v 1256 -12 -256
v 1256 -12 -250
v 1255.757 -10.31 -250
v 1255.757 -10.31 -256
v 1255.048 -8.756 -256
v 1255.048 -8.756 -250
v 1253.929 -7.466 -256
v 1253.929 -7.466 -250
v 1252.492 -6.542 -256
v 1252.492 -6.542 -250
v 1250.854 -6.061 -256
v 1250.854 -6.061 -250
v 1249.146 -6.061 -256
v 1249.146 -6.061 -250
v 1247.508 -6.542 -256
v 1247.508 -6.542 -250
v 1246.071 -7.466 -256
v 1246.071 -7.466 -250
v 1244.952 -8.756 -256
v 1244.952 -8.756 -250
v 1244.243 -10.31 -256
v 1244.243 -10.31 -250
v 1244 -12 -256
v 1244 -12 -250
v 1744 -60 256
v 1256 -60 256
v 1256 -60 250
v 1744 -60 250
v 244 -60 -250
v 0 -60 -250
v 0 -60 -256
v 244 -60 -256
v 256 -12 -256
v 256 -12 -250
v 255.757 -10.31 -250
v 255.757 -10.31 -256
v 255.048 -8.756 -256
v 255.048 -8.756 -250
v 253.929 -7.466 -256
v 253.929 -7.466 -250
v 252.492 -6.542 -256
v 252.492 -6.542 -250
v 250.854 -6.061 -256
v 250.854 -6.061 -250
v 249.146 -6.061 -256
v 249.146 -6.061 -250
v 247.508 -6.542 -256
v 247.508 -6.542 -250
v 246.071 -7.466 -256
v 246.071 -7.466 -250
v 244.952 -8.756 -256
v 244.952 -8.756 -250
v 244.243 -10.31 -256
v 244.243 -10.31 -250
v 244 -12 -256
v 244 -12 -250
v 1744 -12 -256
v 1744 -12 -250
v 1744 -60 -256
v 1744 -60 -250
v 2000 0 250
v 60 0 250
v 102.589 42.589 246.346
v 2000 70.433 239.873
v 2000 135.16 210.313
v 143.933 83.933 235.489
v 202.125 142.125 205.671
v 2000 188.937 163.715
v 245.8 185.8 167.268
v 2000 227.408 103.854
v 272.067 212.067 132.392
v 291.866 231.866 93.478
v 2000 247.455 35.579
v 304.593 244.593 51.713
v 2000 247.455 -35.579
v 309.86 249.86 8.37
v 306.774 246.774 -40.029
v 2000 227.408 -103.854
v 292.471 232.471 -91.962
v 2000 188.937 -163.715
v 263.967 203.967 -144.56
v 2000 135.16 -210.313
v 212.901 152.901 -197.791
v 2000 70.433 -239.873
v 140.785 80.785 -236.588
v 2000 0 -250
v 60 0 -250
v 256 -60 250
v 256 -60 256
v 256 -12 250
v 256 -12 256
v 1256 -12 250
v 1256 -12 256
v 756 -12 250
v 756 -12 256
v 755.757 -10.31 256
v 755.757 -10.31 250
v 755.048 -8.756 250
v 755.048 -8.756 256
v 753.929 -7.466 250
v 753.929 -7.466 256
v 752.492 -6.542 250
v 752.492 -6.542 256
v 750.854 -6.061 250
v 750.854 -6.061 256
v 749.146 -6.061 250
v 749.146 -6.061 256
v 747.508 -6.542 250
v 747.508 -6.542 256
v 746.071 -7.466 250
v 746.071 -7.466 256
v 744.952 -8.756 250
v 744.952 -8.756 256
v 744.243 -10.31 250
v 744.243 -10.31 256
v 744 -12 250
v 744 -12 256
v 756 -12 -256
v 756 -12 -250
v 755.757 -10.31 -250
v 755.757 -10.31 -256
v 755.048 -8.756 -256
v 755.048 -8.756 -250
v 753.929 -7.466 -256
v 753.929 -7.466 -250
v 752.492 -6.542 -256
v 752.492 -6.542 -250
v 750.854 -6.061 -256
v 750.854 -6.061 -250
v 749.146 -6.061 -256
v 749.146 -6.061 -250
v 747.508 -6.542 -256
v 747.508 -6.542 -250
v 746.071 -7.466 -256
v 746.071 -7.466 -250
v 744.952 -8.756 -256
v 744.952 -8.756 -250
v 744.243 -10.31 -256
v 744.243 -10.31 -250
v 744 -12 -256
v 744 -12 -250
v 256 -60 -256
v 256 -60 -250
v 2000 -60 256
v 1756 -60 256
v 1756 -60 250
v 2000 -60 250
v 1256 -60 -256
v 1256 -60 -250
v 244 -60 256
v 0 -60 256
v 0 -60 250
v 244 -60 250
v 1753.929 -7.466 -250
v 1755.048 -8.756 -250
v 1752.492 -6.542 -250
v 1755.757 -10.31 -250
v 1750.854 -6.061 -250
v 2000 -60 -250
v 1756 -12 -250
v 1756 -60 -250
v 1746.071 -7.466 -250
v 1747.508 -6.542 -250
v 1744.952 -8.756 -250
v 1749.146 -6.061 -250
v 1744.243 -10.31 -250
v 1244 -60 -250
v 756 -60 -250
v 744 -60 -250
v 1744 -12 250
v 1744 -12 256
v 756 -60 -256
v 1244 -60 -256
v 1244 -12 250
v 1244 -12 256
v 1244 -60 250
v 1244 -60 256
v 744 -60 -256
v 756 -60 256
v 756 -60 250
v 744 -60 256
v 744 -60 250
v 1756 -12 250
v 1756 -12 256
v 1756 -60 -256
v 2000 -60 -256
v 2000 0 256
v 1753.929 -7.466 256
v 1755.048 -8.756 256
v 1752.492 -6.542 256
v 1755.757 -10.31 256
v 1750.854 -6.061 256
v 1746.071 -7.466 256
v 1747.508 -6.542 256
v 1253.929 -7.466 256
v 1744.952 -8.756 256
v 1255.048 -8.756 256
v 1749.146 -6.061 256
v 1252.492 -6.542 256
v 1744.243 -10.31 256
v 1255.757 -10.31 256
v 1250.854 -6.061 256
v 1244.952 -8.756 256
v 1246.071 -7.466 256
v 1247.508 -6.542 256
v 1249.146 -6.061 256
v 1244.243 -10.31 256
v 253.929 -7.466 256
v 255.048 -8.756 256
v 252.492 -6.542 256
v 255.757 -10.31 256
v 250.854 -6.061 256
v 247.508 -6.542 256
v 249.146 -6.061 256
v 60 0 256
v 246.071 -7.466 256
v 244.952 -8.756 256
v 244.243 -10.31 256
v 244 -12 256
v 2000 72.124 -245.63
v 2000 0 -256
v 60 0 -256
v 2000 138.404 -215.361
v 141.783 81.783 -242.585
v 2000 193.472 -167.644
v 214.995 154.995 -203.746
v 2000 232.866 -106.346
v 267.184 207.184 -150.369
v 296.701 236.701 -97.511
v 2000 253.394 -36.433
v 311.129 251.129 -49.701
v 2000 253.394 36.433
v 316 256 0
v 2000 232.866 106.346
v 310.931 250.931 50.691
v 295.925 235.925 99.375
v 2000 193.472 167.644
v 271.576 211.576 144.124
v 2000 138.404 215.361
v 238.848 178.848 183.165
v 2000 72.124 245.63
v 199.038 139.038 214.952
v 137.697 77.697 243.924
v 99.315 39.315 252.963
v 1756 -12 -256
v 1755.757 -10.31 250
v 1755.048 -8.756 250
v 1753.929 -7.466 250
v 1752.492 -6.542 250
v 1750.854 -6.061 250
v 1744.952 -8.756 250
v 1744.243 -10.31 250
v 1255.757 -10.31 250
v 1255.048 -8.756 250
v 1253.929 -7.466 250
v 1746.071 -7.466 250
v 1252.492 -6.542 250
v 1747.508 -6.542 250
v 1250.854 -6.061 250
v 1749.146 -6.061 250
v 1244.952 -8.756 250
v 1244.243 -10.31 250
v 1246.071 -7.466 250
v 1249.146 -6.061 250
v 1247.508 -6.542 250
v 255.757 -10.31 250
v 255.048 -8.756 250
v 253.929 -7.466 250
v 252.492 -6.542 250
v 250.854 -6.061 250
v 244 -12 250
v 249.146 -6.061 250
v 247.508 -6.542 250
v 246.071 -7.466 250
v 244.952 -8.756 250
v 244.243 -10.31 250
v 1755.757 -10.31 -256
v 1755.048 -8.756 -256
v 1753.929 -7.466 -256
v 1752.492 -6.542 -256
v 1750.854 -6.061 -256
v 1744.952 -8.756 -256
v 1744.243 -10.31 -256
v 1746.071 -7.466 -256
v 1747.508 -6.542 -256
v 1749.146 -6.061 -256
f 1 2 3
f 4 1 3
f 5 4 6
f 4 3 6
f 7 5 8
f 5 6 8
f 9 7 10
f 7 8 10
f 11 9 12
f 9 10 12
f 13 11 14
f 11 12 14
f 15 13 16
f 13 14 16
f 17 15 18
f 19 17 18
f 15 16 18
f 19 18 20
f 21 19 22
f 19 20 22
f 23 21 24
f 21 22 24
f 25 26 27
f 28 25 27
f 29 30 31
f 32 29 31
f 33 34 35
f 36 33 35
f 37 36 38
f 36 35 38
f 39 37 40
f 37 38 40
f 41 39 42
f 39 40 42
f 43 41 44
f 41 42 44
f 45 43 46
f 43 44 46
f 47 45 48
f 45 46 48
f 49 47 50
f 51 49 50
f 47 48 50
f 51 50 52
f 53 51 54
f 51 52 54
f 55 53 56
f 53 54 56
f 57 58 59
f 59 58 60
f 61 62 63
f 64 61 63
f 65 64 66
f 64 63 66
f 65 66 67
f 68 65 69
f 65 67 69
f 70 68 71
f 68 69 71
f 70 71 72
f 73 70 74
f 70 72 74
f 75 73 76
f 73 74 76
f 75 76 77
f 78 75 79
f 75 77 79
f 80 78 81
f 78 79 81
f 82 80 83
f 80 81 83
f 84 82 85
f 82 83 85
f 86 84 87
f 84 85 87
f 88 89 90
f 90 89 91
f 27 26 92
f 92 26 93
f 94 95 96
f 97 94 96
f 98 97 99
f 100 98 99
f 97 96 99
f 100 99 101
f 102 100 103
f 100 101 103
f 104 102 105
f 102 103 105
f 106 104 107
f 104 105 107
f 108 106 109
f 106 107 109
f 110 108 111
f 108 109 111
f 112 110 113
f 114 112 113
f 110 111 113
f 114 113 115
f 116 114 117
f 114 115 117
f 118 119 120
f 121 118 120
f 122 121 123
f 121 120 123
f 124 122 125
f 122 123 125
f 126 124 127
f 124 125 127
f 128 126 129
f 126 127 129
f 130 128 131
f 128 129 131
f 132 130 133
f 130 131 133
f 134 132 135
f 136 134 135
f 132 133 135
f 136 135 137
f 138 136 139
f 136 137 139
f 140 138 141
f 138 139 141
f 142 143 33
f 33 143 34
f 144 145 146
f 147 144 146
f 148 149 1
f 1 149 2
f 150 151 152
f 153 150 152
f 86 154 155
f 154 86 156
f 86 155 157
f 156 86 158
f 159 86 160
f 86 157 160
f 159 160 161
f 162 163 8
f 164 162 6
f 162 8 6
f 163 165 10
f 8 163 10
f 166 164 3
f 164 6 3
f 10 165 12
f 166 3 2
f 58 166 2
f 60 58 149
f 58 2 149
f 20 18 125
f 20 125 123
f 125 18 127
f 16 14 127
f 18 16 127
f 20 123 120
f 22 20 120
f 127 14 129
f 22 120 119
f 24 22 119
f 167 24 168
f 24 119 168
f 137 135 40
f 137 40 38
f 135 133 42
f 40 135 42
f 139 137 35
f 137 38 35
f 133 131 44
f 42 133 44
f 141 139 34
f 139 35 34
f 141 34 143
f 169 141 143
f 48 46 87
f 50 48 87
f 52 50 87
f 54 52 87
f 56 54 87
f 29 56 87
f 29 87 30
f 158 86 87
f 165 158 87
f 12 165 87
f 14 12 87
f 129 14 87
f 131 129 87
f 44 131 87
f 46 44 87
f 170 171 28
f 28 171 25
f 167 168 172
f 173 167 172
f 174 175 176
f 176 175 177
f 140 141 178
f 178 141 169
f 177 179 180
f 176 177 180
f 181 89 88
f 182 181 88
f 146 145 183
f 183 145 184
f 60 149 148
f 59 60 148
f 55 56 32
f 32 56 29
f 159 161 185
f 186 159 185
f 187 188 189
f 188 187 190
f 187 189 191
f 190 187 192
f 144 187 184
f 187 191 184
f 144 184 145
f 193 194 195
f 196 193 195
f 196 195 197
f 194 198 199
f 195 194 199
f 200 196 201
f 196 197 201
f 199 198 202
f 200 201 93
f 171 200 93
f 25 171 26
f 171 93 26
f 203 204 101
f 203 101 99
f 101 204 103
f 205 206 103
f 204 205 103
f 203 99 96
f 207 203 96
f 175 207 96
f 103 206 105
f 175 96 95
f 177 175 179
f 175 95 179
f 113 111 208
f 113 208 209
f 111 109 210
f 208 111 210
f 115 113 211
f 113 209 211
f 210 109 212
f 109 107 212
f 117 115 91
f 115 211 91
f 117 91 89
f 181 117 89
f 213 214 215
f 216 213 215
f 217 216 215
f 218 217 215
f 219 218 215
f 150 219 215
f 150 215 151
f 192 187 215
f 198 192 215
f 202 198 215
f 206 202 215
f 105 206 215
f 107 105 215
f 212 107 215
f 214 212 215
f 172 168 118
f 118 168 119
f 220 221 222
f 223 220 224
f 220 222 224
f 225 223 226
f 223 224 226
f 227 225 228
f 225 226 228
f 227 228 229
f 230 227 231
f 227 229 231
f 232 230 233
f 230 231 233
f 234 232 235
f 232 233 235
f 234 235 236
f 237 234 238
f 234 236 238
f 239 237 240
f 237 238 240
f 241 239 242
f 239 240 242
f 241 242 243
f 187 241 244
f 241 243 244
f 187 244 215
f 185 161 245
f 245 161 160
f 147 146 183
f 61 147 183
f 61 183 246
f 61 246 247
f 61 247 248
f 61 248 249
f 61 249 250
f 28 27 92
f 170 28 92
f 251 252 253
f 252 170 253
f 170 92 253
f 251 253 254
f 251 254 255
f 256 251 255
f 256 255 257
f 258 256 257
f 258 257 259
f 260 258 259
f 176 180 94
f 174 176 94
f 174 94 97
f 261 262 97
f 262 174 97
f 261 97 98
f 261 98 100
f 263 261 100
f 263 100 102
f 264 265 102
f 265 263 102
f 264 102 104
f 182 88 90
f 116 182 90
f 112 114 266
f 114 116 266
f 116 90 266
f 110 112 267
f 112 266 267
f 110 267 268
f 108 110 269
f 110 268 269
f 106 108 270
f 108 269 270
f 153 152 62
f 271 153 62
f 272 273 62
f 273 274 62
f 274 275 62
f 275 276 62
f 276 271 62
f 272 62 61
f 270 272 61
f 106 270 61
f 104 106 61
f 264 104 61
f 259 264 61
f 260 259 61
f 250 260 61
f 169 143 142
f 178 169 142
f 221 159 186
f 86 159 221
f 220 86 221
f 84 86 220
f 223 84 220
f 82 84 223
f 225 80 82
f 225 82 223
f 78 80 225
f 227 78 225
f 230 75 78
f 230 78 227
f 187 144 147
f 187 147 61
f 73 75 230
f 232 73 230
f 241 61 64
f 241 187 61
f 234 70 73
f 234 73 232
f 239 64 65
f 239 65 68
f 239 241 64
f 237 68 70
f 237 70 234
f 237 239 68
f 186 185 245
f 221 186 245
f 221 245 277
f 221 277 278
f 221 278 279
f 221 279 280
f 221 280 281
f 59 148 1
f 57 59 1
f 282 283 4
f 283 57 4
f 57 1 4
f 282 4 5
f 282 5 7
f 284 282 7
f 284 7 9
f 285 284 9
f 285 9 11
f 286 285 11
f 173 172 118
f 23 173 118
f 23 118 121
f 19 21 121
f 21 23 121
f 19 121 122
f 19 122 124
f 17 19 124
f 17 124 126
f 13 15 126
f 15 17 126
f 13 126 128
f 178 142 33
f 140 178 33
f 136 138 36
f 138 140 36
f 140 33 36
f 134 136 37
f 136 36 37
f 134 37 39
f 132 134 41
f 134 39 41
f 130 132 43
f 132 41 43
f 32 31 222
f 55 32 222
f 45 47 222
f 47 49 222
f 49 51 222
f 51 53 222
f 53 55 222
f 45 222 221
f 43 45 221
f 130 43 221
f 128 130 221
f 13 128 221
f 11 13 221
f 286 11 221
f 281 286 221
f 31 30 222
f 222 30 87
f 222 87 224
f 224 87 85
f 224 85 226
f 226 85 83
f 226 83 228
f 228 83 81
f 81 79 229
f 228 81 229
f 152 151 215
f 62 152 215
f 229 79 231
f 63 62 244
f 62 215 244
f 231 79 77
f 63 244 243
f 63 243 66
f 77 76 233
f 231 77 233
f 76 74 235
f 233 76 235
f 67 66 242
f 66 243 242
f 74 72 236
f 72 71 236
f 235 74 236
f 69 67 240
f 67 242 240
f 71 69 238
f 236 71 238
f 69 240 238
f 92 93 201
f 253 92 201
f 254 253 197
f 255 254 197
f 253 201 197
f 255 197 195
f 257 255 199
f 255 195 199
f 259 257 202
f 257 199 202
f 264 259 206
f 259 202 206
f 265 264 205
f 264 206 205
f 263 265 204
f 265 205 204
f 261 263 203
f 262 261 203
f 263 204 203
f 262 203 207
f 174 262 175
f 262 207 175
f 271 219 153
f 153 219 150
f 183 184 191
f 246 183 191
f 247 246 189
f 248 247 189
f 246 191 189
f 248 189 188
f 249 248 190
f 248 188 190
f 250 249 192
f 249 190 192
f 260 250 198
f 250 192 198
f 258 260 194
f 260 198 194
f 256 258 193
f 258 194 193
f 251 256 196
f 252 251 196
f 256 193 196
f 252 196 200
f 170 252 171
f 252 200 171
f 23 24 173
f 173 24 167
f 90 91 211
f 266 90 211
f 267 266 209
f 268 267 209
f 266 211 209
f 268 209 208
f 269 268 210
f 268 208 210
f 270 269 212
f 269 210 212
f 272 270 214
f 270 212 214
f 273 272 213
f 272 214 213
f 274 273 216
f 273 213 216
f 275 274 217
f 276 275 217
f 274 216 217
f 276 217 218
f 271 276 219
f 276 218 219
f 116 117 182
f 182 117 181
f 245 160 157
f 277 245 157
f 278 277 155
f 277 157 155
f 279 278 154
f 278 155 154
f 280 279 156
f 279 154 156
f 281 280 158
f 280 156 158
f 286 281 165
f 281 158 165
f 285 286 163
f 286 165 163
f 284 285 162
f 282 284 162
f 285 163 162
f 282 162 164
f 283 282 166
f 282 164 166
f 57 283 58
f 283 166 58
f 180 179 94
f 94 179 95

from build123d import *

# Parameters (mm, degrees)
F1_DEPTH = 2000
F3_DEPTH = 550
F5_DEPTH = 512.001


with BuildPart() as f1:
    # F0 (on Right) → F1 (new body)
    with BuildSketch(Plane.YZ):
        with BuildLine():
            ThreePointArc((0, 250), (250, 0), (0, -250))
            Line((0, -250), (-60, -250))
            Line((-60, -250), (-60, -256))
            Line((-60, -256), (0, -256))
            ThreePointArc((0, -256), (256, 0), (0, 256))
            Line((0, 256), (-60, 256))
            Line((-60, 256), (-60, 250))
            Line((-60, 250), (0, 250))
        make_face()
    extrude(amount=F1_DEPTH)

    # F2 (on face) → F3 (cut)
    with BuildSketch(Plane.XY.offset(256)):
        Polygon((0, 0), (60, 0), (316, 256), (0, 256), align=None)
        Polygon((0, 0), (0, -60), (60, 0), align=None)
    extrude(amount=-F3_DEPTH, mode=Mode.SUBTRACT)

    # F4 (on face) → F5 (cut, through all)
    with BuildSketch(Plane.XY.offset(256)):
        with BuildLine():
            Line((244, -12), (244, -60))
            Line((244, -60), (256, -60))
            Line((256, -60), (256, -12))
            ThreePointArc((256, -12), (250, -6), (244, -12))
        make_face()
        with BuildLine():
            Line((744, -12), (744, -60))
            Line((744, -60), (756, -60))
            Line((756, -60), (756, -12))
            ThreePointArc((756, -12), (750, -6), (744, -12))
        make_face()
        with BuildLine():
            Line((1244, -12), (1244, -60))
            Line((1244, -60), (1256, -60))
            Line((1256, -60), (1256, -12))
            ThreePointArc((1256, -12), (1250, -6), (1244, -12))
        make_face()
        with BuildLine():
            Line((1744, -60), (1756, -60))
            Line((1756, -60), (1756, -12))
            ThreePointArc((1756, -12), (1750, -6), (1744, -12))
            Line((1744, -12), (1744, -60))
        make_face()
    extrude(amount=-F5_DEPTH, mode=Mode.SUBTRACT)


solid = f1.part
